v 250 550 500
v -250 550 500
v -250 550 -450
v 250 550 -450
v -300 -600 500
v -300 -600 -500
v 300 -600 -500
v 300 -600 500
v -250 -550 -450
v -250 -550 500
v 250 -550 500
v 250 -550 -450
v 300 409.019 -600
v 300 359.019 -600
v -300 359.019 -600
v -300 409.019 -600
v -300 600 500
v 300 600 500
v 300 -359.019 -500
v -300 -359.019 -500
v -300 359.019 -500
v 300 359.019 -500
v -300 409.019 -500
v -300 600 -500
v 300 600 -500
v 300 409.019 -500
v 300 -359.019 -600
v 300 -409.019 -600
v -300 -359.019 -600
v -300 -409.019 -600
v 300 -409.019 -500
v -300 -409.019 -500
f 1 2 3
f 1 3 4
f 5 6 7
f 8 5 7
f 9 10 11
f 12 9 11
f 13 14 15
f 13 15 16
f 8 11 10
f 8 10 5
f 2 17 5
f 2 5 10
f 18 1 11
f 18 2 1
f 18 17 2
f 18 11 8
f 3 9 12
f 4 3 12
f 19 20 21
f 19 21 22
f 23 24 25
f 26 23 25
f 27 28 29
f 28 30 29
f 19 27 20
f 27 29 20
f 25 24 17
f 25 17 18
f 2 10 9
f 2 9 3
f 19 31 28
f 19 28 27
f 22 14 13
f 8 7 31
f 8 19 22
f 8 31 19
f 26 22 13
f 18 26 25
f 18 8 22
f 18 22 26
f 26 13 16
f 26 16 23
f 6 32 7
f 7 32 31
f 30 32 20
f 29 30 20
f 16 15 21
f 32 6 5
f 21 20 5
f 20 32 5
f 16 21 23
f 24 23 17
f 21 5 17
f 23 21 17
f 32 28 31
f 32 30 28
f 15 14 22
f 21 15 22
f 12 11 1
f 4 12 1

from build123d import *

# Parameters (mm, degrees)
F0_W     = 600
F0_H     = 1200
F1_DEPTH = 500
F2_T     = -50
F3_W     = 50
F3_H     = 100
F4_DEPTH = 300


with BuildPart() as f1:
    # F0 (on Top) → F1 (new body, symmetric)
    with BuildSketch(Plane.XY):
        Rectangle(F0_W, F0_H)
    extrude(amount=F1_DEPTH, both=True)

    # F2
    f2_openings = [f1.faces().sort_by_distance(p)[0] for p in [
        (0, 0, 500),
    ]]
    offset(amount=F2_T, openings=f2_openings)

    # F3 (on Right) → F4 (join, symmetric)
    with BuildSketch(Plane.YZ):
        with Locations((-384.018666, -550)):
            Rectangle(F3_W, F3_H)
        with Locations((384.018666, -550)):
            Rectangle(F3_W, F3_H)
    extrude(amount=F4_DEPTH, both=True)


solid = f1.part
